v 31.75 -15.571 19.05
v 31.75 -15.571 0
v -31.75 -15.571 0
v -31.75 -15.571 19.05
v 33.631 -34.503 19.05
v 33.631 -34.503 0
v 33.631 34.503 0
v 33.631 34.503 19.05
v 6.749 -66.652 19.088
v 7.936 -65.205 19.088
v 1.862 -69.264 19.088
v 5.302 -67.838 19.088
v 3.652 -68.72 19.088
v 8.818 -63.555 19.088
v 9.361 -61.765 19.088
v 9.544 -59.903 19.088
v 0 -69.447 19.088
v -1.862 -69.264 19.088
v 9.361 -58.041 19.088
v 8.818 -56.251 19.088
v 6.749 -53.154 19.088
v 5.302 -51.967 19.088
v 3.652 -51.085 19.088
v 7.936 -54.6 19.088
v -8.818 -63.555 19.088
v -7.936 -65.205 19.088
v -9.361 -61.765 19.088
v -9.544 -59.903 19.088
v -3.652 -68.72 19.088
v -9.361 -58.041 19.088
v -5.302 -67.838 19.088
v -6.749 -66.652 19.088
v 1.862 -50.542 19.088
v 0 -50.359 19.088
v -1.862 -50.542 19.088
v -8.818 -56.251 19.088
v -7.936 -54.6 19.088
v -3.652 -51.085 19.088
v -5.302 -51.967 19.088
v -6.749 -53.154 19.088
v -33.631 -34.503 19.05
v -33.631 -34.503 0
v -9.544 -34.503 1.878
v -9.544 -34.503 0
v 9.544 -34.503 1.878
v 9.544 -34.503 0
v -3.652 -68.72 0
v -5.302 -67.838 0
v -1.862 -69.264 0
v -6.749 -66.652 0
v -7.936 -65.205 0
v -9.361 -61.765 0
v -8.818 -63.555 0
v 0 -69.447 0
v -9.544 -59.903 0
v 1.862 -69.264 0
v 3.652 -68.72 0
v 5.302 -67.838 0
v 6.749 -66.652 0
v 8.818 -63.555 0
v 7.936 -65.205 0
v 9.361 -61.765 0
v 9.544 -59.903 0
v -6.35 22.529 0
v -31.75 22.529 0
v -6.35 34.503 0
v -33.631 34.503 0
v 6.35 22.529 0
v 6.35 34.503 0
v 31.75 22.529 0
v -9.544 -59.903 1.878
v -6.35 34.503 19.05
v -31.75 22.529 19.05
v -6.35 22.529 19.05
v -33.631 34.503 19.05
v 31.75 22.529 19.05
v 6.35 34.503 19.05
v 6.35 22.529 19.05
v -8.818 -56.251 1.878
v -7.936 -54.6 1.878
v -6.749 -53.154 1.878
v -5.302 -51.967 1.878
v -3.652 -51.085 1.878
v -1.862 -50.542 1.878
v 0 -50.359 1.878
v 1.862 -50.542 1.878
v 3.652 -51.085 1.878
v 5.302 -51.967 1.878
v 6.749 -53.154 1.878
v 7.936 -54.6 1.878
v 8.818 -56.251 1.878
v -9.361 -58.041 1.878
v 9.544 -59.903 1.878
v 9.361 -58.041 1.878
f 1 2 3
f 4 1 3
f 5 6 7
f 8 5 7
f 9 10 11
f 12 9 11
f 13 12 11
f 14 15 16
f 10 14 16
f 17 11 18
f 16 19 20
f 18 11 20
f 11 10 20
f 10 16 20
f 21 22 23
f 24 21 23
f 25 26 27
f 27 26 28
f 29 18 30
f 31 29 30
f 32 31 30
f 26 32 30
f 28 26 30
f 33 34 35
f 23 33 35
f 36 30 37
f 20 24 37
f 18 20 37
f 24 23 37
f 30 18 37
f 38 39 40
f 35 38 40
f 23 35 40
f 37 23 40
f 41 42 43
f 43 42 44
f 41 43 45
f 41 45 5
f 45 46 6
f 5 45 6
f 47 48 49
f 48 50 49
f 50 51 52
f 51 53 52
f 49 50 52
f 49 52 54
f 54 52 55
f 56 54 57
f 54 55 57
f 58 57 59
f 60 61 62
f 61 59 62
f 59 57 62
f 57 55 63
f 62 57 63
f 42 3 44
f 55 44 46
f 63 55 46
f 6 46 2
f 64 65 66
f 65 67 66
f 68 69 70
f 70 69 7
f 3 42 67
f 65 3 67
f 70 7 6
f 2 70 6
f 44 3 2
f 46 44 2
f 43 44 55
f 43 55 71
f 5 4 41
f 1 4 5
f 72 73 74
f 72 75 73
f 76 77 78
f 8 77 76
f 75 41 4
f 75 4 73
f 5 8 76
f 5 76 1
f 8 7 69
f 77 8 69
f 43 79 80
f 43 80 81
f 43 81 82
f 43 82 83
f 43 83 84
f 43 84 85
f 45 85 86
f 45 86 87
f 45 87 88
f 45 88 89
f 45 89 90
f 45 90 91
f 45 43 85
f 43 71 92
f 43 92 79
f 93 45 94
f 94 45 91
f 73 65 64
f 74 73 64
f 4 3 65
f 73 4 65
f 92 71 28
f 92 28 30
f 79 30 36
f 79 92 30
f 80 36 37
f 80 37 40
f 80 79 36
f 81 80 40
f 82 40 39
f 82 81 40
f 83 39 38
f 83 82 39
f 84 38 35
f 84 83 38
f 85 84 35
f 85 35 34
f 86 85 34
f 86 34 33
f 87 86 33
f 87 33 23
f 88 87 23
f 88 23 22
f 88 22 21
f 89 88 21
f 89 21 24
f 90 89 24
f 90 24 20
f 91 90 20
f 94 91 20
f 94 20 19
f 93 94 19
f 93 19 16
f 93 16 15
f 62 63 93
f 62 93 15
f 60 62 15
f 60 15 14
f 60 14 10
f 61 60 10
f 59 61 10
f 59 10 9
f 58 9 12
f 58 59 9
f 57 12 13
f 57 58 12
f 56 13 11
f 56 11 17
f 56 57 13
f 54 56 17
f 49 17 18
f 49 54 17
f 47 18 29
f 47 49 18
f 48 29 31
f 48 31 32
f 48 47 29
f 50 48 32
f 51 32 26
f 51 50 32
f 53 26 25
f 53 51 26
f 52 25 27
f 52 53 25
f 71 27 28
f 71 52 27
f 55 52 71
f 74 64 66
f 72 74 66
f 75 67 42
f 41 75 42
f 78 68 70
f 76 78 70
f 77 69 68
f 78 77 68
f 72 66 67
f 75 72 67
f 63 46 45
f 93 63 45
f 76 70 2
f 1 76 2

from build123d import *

# Parameters (mm, degrees)
BOSS_EXTRUDE1_DEPTH = 19.05
SKETCH2_W           = 19.08812797
SKETCH2_H           = 1.877723278
BOSS_EXTRUDE3_DEPTH = 25.4
SKETCH3_R           = 9.544063985
BOSS_EXTRUDE4_DEPTH = 19.08812797


with BuildPart() as part:
    # Sketch1 → Boss-Extrude1 (new body)
    with BuildSketch(Plane.XY):
        Polygon((-33.631481481, 34.502858519), (-33.631481481, -34.502858519), (33.631481481, -34.502858519), (33.631481481, 34.502858519), (6.35, 34.502858519), (6.35, 22.529183691), (31.75, 22.529183691), (31.75, -15.570816309), (-31.75, -15.570816309), (-31.75, 22.529183691), (-6.35, 22.529183691), (-6.35, 34.502858519), align=None)
    extrude(amount=BOSS_EXTRUDE1_DEPTH)

    # Sketch2 → Boss-Extrude3 (add)
    with BuildSketch(Plane.XZ.offset(34.502858519)):
        with Locations((0, 0.938861639)):
            Rectangle(SKETCH2_W, SKETCH2_H)
    extrude(amount=BOSS_EXTRUDE3_DEPTH)

    # Sketch3 → Boss-Extrude4 (add)
    with BuildSketch(Plane(origin=(0, 0, 0), x_dir=(-1, 0, 0), z_dir=(0, 0, -1))):
        with Locations((0, -59.902858519)):
            Circle(SKETCH3_R)
    extrude(amount=-BOSS_EXTRUDE4_DEPTH)


solid = part.part
